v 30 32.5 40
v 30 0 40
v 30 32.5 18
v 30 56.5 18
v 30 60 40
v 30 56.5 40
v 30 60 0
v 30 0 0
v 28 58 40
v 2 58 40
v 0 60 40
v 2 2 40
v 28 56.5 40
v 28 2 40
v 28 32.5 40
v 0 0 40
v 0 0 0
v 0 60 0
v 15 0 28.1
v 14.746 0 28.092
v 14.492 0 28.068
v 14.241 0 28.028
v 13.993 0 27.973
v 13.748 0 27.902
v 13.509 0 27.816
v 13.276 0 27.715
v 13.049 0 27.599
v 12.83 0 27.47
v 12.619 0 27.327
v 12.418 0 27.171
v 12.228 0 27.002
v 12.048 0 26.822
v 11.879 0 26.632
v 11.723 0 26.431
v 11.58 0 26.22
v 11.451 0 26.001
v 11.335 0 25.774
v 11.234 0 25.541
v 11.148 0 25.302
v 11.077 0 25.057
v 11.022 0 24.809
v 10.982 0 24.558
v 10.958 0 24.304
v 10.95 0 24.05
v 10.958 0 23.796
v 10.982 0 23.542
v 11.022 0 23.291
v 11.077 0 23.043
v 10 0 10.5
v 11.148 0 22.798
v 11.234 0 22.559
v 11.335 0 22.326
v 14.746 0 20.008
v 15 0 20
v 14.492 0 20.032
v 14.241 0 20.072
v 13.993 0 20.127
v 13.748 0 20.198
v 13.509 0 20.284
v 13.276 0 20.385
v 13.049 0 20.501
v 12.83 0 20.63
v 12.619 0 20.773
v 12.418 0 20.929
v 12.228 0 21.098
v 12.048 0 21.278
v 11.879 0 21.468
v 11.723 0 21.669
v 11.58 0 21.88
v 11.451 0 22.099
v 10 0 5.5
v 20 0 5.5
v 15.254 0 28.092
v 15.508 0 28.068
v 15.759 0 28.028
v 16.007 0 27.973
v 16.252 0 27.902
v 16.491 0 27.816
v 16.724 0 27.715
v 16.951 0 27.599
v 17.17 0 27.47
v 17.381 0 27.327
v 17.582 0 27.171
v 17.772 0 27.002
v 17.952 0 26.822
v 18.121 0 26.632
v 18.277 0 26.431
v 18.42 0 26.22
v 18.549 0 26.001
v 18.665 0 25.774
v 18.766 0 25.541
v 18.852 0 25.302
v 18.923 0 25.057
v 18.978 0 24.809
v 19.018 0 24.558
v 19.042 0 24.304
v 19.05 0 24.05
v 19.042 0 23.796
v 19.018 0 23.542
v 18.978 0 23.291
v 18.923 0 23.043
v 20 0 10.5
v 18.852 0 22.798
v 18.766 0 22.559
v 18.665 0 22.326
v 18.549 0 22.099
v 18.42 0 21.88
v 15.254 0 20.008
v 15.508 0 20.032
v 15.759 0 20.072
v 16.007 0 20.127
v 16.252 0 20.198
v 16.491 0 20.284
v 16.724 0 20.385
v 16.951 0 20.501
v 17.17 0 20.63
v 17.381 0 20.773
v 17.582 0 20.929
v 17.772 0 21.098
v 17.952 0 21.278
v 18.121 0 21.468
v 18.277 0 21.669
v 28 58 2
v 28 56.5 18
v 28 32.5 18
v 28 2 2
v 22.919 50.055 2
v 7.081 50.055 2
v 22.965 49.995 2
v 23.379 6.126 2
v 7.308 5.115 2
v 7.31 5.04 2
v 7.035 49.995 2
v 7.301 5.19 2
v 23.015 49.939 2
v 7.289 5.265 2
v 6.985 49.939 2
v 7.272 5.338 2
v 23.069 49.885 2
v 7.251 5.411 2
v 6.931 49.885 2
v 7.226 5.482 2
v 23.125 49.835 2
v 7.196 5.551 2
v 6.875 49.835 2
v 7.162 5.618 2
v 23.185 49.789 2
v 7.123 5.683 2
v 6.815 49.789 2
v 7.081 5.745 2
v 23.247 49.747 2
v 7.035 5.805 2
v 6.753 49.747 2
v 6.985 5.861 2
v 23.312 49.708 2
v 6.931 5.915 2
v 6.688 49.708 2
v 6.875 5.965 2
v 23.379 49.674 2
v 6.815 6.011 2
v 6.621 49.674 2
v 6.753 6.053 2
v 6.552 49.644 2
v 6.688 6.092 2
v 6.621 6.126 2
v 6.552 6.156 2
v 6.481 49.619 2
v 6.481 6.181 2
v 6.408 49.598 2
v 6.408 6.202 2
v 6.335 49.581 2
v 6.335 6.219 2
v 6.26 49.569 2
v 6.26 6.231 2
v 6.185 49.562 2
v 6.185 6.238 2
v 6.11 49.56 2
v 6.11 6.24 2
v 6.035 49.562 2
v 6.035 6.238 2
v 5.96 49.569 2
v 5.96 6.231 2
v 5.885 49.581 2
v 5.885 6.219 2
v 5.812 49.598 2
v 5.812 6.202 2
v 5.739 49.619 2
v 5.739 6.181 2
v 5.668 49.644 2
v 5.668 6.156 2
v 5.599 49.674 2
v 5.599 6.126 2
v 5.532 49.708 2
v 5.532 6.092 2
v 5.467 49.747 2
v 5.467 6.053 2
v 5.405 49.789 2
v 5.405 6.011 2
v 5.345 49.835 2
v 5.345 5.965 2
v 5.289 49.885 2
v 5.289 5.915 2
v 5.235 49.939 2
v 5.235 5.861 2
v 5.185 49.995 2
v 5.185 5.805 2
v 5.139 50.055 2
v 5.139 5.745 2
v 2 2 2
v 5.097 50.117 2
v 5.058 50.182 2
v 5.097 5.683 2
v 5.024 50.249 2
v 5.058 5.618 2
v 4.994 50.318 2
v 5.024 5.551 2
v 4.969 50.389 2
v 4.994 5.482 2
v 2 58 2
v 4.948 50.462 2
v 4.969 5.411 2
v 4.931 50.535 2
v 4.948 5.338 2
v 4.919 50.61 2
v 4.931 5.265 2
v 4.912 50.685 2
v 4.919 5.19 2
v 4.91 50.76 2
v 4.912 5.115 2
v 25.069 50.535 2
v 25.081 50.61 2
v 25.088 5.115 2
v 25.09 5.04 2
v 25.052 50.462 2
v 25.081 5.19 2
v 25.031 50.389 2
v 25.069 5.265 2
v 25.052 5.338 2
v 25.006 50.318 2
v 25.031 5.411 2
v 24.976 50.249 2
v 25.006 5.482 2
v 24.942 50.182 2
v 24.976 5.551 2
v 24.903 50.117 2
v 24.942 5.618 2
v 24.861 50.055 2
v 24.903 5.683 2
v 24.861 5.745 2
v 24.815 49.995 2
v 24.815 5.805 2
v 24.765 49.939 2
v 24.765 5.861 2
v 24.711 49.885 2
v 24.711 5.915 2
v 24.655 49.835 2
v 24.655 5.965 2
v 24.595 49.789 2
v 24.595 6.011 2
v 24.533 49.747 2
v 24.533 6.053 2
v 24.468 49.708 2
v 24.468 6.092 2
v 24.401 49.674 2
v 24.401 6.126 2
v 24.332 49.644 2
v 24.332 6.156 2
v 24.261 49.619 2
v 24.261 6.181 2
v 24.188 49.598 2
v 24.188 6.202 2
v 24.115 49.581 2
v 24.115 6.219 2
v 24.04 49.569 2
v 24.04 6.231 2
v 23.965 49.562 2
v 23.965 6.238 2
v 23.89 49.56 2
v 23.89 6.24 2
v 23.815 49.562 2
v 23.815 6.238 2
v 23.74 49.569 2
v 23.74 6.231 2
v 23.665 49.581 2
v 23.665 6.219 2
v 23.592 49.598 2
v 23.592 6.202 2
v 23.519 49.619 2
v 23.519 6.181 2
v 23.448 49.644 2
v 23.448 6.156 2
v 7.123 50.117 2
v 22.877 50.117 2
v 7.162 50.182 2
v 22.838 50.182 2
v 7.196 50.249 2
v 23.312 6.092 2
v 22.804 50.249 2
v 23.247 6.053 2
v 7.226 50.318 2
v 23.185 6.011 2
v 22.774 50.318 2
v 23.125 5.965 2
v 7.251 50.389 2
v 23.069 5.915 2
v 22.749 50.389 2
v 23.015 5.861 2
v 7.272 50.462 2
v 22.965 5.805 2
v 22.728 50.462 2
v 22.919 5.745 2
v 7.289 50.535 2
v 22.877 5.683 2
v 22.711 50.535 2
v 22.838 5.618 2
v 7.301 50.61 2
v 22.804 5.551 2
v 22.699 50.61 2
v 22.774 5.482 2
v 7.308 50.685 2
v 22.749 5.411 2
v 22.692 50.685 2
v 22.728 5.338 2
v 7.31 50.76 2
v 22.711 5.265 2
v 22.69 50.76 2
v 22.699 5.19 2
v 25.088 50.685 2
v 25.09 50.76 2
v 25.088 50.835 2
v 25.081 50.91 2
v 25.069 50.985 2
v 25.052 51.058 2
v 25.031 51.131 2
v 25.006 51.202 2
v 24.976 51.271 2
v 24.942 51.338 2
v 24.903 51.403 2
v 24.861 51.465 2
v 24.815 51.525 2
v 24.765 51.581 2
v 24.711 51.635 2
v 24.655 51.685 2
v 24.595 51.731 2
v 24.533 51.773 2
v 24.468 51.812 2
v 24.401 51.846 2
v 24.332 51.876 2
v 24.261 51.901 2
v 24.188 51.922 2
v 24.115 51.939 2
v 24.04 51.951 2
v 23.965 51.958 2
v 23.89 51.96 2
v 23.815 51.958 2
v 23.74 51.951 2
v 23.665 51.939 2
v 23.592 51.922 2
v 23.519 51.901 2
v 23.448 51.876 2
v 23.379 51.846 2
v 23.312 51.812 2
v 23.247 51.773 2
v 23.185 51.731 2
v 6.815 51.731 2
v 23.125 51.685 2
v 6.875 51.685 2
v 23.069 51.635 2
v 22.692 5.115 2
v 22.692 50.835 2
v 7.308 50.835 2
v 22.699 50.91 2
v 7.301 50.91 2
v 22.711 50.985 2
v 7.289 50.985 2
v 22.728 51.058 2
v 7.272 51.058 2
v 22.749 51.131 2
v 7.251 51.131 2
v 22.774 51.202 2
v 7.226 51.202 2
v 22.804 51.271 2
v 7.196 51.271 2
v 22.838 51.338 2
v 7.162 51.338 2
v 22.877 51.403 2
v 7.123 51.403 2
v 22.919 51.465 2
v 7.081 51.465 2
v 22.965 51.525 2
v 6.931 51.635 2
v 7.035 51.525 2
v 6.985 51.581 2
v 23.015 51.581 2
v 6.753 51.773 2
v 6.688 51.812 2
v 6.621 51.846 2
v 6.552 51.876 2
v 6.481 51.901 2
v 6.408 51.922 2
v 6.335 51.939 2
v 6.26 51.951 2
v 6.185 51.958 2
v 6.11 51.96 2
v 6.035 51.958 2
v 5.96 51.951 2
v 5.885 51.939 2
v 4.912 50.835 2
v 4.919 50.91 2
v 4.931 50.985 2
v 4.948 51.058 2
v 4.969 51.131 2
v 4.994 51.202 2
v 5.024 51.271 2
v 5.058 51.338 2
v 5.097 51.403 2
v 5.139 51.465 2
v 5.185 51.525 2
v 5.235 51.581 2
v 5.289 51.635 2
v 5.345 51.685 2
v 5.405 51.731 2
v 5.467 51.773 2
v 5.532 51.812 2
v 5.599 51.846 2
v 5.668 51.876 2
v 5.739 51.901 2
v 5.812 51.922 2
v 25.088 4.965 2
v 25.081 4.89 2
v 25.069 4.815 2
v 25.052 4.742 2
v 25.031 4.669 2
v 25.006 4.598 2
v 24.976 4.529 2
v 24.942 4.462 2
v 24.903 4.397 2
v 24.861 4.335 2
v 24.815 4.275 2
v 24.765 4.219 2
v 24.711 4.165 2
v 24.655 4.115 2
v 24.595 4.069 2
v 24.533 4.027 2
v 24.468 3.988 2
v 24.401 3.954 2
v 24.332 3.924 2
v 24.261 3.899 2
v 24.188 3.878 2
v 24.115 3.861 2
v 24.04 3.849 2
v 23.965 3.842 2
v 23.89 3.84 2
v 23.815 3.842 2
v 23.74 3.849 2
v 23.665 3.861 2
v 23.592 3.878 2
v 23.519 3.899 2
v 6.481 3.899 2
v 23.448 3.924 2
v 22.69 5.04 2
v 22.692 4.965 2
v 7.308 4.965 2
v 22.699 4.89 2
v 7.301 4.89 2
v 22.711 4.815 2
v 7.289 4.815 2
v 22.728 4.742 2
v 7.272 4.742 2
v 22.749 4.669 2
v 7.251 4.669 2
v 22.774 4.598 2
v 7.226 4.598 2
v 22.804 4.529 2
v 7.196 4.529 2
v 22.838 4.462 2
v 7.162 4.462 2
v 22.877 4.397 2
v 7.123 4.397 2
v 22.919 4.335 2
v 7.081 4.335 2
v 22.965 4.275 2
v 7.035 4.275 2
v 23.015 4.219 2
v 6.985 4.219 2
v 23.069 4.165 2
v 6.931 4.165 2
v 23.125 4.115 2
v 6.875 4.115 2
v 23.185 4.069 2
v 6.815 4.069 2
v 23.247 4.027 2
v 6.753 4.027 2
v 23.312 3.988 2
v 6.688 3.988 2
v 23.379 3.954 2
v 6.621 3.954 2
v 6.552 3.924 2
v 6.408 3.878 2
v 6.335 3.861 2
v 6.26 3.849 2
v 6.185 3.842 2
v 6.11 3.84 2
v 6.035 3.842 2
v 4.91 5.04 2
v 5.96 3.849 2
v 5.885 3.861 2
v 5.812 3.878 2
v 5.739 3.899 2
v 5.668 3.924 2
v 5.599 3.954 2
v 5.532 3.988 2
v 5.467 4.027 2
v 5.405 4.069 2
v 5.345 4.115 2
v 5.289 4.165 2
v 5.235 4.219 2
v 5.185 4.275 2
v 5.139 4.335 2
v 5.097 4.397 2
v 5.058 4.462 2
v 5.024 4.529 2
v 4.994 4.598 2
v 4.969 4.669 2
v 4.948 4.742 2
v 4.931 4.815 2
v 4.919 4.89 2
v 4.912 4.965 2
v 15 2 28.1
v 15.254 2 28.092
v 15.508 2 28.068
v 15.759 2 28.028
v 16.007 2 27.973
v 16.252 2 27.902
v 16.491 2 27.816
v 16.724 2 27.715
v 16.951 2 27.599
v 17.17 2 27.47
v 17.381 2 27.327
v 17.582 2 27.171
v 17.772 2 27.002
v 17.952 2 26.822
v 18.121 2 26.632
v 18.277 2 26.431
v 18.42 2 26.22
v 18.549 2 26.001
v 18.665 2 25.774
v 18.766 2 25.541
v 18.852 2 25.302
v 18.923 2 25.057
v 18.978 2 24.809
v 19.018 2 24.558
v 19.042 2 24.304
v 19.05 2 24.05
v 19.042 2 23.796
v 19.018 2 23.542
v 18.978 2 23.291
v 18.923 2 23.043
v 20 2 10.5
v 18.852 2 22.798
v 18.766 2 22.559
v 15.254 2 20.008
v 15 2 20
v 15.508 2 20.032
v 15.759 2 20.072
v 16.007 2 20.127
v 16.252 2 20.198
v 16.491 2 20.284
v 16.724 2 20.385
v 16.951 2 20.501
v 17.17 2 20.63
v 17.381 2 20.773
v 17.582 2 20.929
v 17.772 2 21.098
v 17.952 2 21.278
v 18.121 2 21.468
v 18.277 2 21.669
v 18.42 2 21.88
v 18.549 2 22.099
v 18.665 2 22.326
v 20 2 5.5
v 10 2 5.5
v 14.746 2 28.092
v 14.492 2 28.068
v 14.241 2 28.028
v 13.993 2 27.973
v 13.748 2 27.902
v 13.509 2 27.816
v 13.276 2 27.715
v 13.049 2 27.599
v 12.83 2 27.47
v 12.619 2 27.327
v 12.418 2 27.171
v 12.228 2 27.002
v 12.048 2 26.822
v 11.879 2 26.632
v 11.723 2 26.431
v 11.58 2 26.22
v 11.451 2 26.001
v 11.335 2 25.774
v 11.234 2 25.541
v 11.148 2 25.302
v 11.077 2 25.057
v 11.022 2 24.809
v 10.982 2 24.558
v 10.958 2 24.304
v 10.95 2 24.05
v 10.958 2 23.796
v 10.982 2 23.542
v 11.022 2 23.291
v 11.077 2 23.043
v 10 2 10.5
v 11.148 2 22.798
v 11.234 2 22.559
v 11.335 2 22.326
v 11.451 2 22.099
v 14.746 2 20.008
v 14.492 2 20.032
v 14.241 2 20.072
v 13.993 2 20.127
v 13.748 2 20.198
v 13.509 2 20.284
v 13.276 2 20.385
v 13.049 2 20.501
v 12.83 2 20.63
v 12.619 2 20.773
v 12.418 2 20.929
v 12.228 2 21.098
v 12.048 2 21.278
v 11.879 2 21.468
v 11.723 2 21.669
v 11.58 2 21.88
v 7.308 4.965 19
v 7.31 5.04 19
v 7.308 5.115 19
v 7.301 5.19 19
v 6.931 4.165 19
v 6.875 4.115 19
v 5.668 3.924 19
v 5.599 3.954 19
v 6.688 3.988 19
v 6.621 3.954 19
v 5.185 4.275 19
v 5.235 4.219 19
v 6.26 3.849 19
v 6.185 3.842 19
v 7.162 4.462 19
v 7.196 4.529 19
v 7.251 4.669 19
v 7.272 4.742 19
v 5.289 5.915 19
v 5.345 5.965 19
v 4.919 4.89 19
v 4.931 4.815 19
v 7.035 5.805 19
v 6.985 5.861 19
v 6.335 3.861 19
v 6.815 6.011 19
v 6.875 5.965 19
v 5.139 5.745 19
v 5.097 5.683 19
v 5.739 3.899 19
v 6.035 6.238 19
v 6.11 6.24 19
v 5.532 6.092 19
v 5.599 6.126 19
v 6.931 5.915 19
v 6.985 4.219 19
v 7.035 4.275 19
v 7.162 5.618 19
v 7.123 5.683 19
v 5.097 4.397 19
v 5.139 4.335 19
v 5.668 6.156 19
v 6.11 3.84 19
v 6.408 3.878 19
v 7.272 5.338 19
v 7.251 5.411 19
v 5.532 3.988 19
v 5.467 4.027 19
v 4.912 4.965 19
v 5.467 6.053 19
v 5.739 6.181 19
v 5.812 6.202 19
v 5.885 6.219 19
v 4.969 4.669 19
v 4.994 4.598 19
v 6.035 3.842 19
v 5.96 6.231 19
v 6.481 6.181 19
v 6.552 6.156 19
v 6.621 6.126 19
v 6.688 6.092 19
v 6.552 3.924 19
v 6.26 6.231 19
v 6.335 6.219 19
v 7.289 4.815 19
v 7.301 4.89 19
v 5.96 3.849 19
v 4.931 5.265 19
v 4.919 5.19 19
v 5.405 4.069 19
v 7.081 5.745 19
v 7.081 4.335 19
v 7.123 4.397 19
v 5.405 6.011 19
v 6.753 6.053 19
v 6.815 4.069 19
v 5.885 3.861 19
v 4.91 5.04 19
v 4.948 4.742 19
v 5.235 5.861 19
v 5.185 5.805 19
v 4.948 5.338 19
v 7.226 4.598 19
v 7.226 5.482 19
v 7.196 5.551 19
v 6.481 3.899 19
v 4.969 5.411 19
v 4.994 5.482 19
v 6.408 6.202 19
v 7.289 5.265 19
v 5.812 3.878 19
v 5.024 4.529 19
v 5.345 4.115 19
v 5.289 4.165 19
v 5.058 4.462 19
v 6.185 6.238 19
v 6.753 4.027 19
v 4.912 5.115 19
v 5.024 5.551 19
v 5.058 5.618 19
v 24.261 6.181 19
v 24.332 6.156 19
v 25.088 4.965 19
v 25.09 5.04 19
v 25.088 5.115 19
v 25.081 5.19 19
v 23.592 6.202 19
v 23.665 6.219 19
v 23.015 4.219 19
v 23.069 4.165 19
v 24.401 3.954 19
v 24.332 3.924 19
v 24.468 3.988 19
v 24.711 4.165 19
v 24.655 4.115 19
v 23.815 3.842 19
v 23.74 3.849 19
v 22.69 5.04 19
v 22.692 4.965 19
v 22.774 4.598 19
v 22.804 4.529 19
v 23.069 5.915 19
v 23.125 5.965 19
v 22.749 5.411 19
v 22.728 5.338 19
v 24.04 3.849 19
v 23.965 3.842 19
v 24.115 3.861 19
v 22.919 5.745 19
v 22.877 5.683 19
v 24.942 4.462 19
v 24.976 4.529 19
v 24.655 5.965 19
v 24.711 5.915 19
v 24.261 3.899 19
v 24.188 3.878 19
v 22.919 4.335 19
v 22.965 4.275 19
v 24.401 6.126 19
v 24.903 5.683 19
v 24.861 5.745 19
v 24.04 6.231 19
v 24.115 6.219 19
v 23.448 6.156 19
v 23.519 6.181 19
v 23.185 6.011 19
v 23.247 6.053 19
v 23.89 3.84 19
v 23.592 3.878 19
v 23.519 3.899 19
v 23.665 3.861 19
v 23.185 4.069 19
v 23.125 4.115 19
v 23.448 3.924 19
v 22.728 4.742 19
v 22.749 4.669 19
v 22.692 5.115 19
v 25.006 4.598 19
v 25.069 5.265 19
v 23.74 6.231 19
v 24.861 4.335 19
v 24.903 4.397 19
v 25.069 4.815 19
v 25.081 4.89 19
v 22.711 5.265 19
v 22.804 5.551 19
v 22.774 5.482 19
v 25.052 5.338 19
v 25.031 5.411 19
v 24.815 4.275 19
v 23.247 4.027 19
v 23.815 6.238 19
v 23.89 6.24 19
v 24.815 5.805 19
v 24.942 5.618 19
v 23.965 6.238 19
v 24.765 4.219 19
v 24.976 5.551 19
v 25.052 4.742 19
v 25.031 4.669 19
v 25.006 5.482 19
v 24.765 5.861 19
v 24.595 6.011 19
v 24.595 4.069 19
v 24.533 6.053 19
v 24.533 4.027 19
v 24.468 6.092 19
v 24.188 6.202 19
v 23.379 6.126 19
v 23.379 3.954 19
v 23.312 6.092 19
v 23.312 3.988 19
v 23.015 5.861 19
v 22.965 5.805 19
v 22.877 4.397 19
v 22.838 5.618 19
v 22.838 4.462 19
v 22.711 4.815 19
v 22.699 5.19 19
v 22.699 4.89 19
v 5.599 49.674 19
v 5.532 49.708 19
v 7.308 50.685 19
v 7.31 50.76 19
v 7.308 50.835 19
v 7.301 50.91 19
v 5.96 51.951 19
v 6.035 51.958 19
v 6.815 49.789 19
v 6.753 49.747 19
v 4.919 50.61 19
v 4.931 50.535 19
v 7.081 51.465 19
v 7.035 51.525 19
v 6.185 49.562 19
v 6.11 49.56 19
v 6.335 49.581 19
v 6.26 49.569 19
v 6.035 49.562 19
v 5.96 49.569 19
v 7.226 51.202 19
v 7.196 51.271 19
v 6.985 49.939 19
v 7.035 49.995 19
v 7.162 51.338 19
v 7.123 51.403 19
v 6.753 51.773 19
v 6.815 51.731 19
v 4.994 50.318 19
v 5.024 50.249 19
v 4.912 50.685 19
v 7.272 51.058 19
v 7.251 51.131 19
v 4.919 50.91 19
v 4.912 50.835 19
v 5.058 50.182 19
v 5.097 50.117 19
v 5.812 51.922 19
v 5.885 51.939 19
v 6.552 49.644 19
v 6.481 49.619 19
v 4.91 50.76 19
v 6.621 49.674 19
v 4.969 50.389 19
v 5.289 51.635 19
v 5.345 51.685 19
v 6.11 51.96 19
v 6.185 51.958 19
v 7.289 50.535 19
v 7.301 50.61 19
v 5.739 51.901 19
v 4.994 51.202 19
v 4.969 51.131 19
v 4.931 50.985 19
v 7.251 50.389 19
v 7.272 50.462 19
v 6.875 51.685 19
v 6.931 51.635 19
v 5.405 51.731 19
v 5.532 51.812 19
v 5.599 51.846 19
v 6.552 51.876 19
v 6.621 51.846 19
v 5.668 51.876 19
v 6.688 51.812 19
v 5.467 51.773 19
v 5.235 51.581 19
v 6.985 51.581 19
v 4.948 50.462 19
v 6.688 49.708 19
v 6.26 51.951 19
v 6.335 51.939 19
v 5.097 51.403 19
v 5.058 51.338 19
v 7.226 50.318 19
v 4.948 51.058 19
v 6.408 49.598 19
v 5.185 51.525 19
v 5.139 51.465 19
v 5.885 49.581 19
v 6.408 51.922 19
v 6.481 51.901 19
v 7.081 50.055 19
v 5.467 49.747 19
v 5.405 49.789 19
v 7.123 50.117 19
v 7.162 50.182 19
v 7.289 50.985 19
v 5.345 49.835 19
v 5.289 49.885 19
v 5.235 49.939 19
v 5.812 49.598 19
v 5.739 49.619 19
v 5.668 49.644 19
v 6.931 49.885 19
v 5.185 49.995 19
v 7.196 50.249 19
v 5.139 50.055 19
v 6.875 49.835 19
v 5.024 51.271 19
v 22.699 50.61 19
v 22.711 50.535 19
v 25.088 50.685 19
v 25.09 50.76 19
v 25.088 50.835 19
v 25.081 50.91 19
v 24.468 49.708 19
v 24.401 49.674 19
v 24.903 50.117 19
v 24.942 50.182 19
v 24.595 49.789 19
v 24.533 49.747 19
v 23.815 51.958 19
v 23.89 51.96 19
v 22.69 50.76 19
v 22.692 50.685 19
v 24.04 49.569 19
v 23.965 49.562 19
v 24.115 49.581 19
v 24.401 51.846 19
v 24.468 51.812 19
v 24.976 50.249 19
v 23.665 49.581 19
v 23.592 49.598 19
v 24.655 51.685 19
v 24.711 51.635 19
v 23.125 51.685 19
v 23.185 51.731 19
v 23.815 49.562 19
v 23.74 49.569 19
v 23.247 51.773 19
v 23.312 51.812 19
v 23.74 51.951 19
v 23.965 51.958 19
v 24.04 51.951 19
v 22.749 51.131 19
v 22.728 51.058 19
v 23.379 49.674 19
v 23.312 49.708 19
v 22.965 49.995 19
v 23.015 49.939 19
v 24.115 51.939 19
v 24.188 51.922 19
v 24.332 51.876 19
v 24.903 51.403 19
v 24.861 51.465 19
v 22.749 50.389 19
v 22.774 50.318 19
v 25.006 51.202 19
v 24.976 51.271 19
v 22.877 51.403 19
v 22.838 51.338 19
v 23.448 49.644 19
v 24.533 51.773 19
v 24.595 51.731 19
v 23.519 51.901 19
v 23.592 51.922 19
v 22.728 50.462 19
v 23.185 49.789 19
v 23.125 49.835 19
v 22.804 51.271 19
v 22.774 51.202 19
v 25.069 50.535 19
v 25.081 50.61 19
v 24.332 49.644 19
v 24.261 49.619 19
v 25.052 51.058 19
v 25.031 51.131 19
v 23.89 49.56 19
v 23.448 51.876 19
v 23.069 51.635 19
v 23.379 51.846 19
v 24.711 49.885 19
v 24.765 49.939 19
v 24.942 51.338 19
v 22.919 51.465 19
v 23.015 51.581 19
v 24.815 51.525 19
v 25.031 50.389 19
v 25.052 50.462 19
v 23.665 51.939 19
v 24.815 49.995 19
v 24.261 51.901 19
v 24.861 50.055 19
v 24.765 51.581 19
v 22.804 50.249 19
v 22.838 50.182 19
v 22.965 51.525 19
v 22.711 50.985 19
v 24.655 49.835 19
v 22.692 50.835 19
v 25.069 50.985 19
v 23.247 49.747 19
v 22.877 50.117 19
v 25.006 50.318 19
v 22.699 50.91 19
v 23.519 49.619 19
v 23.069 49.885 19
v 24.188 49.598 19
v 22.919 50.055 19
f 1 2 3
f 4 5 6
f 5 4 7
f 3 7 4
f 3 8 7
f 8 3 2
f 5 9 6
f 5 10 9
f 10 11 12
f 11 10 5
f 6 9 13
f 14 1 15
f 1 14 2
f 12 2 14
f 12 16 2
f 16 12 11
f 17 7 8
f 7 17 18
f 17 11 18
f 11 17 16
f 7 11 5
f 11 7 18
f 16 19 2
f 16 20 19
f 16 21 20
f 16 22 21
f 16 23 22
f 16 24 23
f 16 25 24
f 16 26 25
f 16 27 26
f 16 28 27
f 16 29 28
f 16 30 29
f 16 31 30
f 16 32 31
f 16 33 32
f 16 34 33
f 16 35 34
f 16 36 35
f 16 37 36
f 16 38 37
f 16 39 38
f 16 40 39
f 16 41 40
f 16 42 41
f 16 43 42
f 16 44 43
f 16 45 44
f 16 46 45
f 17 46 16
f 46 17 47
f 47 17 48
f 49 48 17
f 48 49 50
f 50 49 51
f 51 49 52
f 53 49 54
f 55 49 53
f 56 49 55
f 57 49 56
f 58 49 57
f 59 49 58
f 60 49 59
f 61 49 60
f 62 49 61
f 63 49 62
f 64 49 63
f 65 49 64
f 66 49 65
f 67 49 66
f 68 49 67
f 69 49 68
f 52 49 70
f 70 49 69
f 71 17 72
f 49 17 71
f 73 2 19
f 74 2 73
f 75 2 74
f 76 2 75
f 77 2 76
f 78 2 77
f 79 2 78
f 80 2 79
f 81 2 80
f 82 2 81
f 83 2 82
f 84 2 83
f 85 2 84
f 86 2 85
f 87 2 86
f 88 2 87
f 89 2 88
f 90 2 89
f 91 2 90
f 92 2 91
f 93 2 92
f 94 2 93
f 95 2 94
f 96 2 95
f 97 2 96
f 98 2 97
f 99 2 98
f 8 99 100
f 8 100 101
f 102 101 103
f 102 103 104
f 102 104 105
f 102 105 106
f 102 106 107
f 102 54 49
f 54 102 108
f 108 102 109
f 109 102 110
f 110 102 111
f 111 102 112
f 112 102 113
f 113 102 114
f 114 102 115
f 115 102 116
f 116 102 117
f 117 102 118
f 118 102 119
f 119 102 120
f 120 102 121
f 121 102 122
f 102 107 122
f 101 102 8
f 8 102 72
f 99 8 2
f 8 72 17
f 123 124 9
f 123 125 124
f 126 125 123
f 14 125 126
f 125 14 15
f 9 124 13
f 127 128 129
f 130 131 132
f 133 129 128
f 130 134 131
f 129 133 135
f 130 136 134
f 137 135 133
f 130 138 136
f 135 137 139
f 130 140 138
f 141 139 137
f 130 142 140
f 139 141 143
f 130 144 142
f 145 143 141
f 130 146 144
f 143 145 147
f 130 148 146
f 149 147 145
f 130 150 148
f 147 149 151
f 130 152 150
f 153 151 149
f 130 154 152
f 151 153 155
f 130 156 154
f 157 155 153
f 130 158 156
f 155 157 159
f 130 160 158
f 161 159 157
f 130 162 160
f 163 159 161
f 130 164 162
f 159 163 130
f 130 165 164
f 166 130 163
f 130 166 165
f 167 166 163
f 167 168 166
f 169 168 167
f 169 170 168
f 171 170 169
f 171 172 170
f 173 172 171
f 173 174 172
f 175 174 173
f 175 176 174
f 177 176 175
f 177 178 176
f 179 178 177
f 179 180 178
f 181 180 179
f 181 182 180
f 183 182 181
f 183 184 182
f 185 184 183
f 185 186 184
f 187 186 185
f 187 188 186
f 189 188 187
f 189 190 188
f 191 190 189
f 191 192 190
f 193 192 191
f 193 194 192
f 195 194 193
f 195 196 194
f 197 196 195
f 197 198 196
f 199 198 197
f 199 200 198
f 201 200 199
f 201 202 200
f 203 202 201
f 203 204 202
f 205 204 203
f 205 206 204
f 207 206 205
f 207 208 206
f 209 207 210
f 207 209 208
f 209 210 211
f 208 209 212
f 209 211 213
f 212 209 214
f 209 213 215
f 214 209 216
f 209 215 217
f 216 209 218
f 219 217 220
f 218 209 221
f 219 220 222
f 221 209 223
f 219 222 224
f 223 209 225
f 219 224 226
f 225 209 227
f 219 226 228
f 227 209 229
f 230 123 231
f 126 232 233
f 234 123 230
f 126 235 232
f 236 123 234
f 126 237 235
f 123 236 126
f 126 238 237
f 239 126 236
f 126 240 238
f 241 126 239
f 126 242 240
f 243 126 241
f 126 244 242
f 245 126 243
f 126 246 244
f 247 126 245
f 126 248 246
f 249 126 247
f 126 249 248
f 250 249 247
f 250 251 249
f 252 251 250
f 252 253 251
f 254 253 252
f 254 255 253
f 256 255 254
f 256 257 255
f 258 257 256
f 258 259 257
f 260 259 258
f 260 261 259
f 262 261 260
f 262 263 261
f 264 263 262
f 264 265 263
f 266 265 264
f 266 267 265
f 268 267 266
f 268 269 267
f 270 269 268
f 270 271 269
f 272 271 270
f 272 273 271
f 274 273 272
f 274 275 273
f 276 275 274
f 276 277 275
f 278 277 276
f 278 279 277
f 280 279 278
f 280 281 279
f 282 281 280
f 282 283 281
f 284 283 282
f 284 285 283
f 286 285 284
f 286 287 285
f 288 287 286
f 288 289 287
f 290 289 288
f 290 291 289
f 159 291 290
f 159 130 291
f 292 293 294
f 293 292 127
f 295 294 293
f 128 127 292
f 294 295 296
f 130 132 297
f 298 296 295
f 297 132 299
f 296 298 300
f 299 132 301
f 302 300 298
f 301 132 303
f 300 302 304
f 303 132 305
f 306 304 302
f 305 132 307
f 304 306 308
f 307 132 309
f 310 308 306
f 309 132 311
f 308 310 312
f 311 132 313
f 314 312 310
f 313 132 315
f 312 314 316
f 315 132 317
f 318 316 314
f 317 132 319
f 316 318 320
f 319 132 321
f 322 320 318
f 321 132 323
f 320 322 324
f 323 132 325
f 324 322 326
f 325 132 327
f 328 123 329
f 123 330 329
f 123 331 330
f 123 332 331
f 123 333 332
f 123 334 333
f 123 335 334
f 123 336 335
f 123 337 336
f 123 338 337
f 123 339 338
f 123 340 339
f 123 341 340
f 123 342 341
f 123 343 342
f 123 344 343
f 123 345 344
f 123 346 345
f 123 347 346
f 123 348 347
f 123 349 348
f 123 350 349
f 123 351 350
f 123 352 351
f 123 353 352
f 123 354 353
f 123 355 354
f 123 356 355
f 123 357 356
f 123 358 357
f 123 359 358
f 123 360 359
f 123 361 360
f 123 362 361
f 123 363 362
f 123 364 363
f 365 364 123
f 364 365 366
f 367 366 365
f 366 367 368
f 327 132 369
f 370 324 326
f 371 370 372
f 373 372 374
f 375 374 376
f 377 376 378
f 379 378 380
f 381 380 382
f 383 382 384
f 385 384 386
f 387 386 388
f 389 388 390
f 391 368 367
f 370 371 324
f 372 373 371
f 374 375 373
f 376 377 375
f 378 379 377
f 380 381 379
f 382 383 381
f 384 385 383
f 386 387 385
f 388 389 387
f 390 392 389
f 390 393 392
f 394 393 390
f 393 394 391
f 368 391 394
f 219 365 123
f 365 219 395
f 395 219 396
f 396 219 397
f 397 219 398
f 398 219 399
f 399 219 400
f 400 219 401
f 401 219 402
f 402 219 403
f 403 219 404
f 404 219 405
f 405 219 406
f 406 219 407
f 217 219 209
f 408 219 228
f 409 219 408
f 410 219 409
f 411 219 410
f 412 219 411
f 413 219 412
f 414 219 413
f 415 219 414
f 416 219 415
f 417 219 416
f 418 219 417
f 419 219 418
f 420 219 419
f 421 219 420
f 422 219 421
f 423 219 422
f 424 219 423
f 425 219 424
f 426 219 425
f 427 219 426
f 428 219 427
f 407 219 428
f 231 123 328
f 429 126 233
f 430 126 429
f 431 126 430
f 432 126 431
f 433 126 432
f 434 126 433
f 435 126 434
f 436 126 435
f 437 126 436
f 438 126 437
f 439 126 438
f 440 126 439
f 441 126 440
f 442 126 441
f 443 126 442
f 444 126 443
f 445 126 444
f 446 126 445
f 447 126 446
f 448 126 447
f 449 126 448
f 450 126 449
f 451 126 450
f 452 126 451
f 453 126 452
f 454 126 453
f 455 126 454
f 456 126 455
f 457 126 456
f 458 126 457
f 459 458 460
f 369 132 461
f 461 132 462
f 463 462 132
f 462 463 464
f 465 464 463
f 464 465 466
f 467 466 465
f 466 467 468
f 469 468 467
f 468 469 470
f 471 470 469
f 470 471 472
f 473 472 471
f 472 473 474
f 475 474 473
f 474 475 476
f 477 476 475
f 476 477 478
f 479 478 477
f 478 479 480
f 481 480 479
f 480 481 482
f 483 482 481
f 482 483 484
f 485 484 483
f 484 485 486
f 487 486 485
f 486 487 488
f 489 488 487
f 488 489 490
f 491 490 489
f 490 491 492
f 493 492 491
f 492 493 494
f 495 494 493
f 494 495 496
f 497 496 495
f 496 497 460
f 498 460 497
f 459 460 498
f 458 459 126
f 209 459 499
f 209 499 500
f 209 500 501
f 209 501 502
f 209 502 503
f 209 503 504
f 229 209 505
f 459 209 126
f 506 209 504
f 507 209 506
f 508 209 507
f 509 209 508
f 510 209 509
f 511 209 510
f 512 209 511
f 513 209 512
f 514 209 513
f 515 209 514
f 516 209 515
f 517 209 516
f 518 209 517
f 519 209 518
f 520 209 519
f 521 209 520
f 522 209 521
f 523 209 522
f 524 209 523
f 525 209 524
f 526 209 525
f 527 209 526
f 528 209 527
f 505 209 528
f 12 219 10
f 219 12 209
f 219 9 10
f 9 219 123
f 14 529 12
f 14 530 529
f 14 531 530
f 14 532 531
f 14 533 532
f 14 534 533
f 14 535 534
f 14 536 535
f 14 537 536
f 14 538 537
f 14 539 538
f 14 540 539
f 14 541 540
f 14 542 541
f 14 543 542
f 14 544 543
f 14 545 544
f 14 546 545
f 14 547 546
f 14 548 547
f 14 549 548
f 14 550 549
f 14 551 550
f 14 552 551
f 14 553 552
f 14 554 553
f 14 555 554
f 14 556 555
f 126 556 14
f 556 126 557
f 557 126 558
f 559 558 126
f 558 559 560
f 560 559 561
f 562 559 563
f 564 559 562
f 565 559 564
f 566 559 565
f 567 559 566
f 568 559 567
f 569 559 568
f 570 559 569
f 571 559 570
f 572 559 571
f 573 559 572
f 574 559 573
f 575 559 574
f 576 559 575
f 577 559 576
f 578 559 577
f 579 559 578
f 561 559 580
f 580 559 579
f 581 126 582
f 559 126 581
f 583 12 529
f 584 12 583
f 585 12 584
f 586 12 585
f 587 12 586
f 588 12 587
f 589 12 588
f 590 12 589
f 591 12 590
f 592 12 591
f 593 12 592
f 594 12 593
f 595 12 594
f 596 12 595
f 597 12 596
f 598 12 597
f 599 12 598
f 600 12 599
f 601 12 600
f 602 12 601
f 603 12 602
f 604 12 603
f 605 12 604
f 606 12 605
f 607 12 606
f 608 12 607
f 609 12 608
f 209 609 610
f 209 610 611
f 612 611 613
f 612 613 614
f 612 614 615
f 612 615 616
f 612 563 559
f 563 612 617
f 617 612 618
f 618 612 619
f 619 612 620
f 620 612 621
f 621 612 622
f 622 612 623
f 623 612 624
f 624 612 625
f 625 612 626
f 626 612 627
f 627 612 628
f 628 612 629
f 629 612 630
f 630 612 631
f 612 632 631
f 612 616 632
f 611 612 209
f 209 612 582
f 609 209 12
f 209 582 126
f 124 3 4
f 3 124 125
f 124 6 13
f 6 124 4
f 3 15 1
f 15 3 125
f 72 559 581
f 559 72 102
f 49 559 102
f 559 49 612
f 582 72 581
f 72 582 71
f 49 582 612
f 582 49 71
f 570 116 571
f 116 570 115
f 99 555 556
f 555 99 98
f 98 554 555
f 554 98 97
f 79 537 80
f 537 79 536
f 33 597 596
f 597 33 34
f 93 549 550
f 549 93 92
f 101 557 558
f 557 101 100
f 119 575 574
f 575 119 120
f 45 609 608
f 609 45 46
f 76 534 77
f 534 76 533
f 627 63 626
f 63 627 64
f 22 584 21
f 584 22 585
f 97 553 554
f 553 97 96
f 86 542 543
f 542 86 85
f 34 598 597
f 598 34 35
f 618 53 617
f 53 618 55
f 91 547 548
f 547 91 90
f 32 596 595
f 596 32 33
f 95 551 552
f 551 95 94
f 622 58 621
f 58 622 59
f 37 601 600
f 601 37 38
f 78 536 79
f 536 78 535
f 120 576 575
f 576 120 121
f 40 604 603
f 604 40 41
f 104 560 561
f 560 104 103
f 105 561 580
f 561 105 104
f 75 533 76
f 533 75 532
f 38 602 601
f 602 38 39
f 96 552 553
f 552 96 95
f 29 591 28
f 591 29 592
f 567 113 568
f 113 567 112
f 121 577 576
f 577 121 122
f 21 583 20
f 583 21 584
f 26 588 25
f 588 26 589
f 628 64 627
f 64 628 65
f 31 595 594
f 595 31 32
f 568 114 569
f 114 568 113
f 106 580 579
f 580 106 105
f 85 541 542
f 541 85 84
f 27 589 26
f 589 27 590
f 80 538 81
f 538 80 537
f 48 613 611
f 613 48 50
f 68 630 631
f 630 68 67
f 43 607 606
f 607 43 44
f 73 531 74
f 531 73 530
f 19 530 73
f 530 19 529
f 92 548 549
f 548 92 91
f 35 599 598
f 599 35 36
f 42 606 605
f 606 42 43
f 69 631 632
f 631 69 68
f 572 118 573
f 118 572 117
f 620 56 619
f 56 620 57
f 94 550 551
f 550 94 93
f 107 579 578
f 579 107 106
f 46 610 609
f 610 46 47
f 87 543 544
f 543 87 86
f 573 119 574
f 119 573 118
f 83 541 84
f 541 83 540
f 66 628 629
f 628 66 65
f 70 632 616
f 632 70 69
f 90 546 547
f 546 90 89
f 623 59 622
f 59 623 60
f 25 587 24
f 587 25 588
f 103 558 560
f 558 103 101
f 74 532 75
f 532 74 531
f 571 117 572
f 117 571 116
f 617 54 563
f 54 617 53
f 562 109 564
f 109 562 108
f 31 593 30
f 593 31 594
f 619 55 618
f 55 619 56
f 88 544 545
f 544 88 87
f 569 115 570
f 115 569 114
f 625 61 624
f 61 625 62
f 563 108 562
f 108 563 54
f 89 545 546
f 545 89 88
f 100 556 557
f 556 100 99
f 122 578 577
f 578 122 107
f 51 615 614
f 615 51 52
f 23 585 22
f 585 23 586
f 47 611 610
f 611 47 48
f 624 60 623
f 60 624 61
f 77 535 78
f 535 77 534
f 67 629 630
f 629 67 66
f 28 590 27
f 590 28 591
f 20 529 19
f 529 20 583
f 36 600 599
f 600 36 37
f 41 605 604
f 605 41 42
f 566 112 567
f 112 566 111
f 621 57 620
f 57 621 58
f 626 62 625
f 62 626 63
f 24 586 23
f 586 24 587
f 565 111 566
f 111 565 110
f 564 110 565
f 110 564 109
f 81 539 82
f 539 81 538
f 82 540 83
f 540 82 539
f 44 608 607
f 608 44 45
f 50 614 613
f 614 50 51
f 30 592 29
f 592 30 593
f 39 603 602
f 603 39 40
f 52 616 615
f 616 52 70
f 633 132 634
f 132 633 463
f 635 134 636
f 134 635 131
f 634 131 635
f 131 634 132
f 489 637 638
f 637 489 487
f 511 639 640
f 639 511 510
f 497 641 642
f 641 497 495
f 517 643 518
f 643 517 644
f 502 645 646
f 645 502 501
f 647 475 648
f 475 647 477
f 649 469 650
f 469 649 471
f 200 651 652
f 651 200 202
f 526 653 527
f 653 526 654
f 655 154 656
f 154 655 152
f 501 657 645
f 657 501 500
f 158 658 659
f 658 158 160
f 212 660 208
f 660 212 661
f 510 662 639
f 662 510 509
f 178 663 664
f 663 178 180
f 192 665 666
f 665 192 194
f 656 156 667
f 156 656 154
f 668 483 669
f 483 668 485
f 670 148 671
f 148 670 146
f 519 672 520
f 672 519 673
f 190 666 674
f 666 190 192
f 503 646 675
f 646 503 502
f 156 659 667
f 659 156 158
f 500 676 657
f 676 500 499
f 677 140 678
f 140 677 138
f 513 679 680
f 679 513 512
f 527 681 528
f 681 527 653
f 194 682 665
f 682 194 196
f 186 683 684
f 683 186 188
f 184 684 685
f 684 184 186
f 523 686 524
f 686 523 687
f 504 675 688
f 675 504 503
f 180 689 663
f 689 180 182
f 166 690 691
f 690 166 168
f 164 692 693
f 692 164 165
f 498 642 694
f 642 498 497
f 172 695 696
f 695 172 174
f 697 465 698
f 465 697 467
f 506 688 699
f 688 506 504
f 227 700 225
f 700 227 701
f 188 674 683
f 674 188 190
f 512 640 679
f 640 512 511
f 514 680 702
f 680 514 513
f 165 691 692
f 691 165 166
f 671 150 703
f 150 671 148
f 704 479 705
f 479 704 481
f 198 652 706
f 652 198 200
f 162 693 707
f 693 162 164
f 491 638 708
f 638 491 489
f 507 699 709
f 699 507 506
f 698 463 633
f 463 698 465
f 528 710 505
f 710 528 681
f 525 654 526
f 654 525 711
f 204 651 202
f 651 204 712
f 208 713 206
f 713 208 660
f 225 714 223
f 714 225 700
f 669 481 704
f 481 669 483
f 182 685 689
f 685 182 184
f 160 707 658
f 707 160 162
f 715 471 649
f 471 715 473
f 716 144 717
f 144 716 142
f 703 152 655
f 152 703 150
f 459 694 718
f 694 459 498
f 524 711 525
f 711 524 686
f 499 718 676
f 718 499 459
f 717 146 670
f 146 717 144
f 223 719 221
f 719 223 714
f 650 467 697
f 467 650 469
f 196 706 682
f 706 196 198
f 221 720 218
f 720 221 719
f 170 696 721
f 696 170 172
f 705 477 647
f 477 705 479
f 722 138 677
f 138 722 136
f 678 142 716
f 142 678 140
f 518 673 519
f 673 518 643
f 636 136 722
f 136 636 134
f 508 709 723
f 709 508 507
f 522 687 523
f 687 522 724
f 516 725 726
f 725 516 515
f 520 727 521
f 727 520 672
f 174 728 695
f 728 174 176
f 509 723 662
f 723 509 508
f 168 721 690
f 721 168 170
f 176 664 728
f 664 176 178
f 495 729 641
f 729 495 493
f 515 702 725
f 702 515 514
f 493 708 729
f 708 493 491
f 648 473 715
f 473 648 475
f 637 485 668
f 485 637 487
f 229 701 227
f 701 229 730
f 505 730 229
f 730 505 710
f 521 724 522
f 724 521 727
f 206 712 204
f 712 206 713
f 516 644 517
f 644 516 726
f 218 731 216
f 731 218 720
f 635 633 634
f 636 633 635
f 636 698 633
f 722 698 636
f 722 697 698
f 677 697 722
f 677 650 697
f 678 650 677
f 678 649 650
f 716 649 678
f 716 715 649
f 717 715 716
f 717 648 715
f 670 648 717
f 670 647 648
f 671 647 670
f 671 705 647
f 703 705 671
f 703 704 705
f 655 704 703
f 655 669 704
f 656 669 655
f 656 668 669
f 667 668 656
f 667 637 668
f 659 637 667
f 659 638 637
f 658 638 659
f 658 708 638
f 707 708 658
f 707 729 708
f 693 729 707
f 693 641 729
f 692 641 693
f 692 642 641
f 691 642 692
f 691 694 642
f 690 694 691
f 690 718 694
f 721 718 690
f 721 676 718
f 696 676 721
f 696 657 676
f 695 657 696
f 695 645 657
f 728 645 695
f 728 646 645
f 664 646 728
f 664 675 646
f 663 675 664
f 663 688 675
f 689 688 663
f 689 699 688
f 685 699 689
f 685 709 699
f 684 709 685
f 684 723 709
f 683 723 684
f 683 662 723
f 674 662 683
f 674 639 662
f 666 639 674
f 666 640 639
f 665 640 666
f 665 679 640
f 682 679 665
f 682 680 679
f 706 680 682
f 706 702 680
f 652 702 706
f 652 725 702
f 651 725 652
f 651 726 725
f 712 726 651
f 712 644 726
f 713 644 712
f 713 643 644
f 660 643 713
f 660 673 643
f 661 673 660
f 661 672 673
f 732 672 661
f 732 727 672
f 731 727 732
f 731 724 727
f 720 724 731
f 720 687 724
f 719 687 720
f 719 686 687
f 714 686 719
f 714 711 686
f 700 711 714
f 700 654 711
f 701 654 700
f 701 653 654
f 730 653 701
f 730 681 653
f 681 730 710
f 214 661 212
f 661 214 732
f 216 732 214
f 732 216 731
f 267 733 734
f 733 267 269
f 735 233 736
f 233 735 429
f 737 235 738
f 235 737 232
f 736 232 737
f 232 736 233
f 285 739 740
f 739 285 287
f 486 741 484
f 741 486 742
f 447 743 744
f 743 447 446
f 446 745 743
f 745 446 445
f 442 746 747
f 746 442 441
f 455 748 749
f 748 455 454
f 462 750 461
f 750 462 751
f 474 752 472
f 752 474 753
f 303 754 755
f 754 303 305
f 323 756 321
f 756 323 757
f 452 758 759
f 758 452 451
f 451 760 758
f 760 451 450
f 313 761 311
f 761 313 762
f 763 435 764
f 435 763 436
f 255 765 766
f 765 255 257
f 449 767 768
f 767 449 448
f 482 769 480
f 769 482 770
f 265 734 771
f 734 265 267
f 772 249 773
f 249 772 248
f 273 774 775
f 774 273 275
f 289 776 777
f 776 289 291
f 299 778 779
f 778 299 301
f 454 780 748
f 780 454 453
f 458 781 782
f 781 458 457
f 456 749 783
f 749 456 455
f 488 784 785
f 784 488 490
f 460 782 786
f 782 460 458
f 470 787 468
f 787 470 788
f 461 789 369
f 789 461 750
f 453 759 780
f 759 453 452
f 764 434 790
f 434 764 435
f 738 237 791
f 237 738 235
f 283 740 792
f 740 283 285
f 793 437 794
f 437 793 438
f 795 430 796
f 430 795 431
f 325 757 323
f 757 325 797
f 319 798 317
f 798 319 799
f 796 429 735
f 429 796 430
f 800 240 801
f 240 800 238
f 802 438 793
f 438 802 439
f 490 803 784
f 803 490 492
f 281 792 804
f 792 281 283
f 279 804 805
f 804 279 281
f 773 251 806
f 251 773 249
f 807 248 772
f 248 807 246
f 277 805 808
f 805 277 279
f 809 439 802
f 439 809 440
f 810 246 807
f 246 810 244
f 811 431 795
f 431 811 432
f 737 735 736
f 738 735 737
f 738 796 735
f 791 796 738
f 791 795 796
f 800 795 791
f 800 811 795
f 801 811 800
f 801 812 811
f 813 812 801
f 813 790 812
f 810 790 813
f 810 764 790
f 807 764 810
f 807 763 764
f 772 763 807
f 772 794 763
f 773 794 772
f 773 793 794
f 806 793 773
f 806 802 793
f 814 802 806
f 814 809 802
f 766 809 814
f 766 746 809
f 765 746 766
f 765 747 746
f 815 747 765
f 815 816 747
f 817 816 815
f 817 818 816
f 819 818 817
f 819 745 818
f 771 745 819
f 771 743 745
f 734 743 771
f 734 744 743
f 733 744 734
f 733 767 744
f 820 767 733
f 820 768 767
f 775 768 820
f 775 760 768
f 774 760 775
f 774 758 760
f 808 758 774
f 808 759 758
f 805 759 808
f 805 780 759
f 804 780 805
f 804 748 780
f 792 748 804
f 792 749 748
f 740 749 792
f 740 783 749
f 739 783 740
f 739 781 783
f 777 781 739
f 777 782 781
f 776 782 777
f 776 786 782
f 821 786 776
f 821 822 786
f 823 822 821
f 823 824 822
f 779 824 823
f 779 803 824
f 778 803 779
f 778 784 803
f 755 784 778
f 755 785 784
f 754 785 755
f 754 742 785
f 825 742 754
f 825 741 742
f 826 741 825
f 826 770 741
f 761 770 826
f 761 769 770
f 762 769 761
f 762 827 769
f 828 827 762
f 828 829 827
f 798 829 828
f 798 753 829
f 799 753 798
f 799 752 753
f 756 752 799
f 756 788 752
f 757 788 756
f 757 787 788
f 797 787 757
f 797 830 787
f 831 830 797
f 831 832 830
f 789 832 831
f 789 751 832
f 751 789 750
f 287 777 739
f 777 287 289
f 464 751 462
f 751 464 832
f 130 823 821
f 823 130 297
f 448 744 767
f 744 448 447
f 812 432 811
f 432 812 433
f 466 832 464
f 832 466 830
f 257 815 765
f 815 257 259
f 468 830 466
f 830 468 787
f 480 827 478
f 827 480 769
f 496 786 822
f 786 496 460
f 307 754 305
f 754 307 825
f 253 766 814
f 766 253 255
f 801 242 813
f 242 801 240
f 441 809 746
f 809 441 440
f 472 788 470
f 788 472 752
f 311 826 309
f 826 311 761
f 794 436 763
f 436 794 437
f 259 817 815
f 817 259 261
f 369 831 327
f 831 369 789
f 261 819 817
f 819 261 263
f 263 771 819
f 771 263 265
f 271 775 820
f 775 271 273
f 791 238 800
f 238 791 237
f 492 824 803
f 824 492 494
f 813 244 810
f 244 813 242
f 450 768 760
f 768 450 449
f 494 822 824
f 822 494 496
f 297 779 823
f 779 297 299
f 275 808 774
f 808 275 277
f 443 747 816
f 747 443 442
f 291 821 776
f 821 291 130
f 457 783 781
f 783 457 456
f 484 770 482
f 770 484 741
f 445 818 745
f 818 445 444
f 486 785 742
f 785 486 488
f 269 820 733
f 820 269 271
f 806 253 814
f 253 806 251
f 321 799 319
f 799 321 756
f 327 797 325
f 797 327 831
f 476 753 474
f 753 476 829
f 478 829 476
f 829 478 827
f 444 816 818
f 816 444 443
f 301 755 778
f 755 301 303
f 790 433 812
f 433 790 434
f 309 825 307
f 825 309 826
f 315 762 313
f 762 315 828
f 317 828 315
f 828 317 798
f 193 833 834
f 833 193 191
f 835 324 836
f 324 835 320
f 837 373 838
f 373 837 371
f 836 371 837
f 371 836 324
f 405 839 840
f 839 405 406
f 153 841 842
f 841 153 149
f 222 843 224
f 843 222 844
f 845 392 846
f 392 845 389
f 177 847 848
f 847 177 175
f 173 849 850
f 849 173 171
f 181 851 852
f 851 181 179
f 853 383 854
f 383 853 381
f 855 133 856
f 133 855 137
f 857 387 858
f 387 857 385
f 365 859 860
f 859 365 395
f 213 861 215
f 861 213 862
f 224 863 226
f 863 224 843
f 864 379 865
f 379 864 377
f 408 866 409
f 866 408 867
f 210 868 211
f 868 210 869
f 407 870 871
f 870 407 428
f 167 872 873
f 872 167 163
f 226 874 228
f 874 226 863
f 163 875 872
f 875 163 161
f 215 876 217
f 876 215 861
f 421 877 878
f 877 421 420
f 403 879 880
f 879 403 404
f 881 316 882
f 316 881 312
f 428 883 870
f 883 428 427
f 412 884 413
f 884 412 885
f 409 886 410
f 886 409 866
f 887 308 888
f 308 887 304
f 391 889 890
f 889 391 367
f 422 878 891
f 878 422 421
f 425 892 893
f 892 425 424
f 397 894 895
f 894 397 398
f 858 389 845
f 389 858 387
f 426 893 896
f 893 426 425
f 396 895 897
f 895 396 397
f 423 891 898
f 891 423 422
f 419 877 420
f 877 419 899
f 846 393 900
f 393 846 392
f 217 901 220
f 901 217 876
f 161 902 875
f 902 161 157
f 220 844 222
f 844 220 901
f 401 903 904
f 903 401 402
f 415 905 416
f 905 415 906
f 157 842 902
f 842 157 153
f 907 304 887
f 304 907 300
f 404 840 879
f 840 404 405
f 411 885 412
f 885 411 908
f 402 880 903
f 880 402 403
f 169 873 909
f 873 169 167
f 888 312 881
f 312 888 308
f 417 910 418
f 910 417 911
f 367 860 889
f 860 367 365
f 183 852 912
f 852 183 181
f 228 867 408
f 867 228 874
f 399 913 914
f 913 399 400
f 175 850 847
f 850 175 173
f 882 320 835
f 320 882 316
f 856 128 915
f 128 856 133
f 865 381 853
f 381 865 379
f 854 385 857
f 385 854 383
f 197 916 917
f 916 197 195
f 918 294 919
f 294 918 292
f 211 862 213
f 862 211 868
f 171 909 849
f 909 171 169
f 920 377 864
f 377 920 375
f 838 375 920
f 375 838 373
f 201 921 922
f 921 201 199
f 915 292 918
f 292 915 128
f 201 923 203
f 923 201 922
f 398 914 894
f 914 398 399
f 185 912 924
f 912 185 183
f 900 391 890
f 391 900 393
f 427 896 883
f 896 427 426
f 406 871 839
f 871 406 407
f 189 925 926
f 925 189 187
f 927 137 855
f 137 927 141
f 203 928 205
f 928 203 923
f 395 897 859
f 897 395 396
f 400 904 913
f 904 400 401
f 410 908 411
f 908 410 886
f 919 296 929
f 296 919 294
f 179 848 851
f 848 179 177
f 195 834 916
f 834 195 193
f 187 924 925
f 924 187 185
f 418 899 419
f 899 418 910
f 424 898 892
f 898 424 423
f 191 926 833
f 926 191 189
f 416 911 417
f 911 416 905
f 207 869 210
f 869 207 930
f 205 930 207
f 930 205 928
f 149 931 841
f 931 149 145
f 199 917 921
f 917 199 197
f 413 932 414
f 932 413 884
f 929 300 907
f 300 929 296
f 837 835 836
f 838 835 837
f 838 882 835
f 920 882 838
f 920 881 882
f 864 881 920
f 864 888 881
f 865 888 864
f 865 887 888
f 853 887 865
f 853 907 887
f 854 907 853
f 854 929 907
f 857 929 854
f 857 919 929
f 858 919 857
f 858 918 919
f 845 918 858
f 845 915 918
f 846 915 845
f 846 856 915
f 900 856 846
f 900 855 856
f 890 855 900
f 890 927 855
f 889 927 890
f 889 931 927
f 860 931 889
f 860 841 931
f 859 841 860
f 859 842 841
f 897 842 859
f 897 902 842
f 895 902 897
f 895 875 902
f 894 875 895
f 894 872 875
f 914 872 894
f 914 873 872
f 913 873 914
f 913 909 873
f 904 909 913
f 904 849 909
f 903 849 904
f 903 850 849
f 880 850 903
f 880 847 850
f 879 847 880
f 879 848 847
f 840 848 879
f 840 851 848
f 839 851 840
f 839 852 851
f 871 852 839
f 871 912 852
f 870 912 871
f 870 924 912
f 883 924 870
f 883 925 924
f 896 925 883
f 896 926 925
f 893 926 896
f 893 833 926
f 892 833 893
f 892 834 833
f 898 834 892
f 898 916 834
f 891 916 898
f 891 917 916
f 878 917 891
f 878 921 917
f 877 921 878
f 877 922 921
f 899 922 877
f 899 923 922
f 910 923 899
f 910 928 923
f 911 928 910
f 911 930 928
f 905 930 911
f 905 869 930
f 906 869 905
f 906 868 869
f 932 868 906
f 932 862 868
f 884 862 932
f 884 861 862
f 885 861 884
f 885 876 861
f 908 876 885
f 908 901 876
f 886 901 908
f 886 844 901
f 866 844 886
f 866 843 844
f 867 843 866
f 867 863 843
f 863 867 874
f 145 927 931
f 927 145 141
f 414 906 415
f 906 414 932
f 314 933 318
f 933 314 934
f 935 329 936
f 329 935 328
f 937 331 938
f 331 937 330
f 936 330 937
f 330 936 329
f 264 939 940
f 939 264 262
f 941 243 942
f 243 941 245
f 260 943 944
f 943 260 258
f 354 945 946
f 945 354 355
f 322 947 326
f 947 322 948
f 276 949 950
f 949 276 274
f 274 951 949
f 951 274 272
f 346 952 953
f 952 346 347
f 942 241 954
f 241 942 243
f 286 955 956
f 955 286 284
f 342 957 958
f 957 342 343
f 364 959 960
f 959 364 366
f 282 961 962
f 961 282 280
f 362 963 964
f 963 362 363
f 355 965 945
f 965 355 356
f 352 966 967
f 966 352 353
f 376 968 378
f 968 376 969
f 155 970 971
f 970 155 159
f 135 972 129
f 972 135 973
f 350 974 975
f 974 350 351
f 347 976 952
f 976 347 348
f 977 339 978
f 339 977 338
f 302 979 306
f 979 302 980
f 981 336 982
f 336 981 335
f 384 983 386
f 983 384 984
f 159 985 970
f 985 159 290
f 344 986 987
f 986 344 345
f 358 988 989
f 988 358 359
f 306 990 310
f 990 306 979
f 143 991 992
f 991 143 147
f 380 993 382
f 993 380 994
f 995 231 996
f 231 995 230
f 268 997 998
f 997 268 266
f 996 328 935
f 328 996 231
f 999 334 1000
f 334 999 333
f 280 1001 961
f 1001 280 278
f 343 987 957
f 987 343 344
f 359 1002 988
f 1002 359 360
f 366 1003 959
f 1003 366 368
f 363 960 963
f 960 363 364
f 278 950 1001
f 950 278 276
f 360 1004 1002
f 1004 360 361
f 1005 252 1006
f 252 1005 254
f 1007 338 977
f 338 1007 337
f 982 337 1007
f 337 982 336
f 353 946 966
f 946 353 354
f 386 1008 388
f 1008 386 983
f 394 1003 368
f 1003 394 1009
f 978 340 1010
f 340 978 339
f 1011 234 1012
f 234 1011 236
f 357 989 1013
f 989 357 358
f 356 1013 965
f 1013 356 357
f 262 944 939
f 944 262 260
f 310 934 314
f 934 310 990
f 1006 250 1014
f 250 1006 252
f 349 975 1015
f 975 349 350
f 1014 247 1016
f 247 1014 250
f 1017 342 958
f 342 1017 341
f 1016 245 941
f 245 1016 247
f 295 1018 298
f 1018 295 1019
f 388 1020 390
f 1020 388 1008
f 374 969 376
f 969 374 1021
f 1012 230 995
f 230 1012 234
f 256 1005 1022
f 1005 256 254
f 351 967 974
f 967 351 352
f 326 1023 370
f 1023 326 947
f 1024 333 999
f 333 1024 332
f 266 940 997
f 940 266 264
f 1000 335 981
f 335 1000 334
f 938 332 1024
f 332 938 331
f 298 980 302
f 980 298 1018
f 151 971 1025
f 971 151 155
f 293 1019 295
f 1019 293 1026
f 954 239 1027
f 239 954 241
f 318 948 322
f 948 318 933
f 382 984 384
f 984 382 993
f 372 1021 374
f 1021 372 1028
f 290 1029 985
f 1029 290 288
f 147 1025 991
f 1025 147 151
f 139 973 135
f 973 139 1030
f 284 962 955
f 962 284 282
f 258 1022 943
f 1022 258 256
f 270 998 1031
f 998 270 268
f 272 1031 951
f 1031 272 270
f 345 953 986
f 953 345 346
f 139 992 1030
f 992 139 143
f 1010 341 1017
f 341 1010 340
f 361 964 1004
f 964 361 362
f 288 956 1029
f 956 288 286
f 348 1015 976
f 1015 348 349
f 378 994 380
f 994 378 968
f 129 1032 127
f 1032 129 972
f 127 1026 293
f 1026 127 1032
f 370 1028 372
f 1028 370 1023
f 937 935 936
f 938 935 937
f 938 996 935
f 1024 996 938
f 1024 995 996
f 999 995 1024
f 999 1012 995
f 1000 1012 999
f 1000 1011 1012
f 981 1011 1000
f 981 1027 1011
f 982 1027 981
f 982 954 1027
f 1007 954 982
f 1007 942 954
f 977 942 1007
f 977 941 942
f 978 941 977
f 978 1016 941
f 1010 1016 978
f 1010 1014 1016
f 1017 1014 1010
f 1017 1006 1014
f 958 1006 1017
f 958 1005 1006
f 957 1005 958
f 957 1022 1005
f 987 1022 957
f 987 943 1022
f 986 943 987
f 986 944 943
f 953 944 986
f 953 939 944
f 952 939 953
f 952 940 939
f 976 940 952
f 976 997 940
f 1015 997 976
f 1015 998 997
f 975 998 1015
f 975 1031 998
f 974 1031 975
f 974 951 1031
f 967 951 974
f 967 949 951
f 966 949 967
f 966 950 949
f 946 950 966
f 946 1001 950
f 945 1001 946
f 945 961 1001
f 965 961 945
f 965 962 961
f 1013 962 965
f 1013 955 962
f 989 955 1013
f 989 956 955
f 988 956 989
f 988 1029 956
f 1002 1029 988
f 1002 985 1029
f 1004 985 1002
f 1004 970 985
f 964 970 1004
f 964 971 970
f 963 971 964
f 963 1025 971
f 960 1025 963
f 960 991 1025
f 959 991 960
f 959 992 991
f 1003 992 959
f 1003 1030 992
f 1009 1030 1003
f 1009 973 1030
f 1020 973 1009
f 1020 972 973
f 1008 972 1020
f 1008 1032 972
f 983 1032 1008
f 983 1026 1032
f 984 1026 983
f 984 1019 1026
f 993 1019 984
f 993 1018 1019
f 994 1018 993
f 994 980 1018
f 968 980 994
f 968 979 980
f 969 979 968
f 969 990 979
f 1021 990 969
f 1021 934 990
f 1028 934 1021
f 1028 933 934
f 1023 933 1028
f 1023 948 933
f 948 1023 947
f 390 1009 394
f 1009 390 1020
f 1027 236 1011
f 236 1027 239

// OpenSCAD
wallthick = 2;

peg_r = 2.4/2;
peg_placelow = 0;
peg_placehigh = peg_placelow + 45.72;
fnval = 100;
peg_h = 17;
peg_spread = 17.78;

case_bottom_width = 30;
case_bottom_depth = 60;
case_bottom_height = 40;

pegs_xtranslate = (case_bottom_width-peg_spread)/2;
//pegs_ytranslate = 
//pegs_ztranslate = 

feather_depth = 50.8;
feather_width = 22.86;
feather_height = 1.5;

feather_xtranslate = (case_bottom_width-feather_width)/2;
feather_ytranslate = wallthick+.5;
feather_ztranslate = wallthick+2;


tc_cutout_xtranslate = case_bottom_width-wallthick;
tc_cutout_ytranslate = feather_ytranslate+30;
tc_cutout_ztranslate = wallthick+16;


tc_cutout_width = wallthick;
tc_cutout_depth = 24;
tc_cutout_height = case_bottom_height-tc_cutout_ztranslate;

tc_cover_height = 15;

usb_width = 10;
usb_height = 5;
usb_depth = wallthick;

usb_xtranslate = (case_bottom_width-usb_width)/2;
usb_ytranslate = 0;
usb_ztranslate = feather_ztranslate+feather_height;

dcjack_r = 8.1/2;

dcjack_xtranslate = (case_bottom_width-2*dcjack_r)/2+dcjack_r;
dcjack_ytranslate = 0;
dcjack_ztranslate = feather_ztranslate+16+dcjack_r;

case_bottom();
*case_top();

module case_top() {
    
    translate([0,0,case_bottom_height]) cube([case_bottom_width,case_bottom_depth,wallthick], center=false);

    translate([case_bottom_width-wallthick,tc_cutout_ytranslate,case_bottom_height-tc_cover_height]) cube([wallthick,tc_cutout_depth,tc_cover_height], center=false);

    translate([wallthick,wallthick,case_bottom_height-wallthick]) cube([case_bottom_width-wallthick*2,case_bottom_depth-wallthick*2,wallthick], center=false);
}

module case_bottom() {
    difference() {
        cube([case_bottom_width,case_bottom_depth,case_bottom_height], center=false);
        translate([wallthick,wallthick,wallthick]) cube([case_bottom_width-2*wallthick,case_bottom_depth-2*wallthick,case_bottom_height], center=false);
        translate([tc_cutout_xtranslate,tc_cutout_ytranslate,tc_cutout_ztranslate]) cube([tc_cutout_width,tc_cutout_depth,tc_cutout_height], center=false);
        translate([usb_xtranslate,usb_ytranslate,usb_ztranslate]) cube([usb_width, usb_depth, usb_height],center=false);
        translate([dcjack_xtranslate,dcjack_ytranslate,dcjack_ztranslate]) rotate([270,0,0]) cylinder(wallthick*1.1, dcjack_r, dcjack_r, false, $fn=fnval);
    }
    translate([(case_bottom_width-peg_spread)/2,feather_ytranslate+2.54,0]) pegs();
}


*translate([feather_xtranslate,feather_ytranslate,feather_ztranslate]) feather();

module pegs() {
    translate([0,peg_placelow,wallthick])cylinder(peg_h, peg_r, peg_r, false, $fn=fnval);
    translate([peg_spread,peg_placelow,wallthick]) cylinder(peg_h, peg_r, peg_r, false, $fn=fnval);

    translate([0,peg_placehigh,wallthick])cylinder(peg_h, peg_r, peg_r, false, $fn=fnval);
    translate([peg_spread,peg_placehigh,wallthick]) cylinder(peg_h, peg_r, peg_r, false, $fn=fnval);
}

module feather() {
    cube([feather_width, feather_depth, feather_height], center = false);
}
